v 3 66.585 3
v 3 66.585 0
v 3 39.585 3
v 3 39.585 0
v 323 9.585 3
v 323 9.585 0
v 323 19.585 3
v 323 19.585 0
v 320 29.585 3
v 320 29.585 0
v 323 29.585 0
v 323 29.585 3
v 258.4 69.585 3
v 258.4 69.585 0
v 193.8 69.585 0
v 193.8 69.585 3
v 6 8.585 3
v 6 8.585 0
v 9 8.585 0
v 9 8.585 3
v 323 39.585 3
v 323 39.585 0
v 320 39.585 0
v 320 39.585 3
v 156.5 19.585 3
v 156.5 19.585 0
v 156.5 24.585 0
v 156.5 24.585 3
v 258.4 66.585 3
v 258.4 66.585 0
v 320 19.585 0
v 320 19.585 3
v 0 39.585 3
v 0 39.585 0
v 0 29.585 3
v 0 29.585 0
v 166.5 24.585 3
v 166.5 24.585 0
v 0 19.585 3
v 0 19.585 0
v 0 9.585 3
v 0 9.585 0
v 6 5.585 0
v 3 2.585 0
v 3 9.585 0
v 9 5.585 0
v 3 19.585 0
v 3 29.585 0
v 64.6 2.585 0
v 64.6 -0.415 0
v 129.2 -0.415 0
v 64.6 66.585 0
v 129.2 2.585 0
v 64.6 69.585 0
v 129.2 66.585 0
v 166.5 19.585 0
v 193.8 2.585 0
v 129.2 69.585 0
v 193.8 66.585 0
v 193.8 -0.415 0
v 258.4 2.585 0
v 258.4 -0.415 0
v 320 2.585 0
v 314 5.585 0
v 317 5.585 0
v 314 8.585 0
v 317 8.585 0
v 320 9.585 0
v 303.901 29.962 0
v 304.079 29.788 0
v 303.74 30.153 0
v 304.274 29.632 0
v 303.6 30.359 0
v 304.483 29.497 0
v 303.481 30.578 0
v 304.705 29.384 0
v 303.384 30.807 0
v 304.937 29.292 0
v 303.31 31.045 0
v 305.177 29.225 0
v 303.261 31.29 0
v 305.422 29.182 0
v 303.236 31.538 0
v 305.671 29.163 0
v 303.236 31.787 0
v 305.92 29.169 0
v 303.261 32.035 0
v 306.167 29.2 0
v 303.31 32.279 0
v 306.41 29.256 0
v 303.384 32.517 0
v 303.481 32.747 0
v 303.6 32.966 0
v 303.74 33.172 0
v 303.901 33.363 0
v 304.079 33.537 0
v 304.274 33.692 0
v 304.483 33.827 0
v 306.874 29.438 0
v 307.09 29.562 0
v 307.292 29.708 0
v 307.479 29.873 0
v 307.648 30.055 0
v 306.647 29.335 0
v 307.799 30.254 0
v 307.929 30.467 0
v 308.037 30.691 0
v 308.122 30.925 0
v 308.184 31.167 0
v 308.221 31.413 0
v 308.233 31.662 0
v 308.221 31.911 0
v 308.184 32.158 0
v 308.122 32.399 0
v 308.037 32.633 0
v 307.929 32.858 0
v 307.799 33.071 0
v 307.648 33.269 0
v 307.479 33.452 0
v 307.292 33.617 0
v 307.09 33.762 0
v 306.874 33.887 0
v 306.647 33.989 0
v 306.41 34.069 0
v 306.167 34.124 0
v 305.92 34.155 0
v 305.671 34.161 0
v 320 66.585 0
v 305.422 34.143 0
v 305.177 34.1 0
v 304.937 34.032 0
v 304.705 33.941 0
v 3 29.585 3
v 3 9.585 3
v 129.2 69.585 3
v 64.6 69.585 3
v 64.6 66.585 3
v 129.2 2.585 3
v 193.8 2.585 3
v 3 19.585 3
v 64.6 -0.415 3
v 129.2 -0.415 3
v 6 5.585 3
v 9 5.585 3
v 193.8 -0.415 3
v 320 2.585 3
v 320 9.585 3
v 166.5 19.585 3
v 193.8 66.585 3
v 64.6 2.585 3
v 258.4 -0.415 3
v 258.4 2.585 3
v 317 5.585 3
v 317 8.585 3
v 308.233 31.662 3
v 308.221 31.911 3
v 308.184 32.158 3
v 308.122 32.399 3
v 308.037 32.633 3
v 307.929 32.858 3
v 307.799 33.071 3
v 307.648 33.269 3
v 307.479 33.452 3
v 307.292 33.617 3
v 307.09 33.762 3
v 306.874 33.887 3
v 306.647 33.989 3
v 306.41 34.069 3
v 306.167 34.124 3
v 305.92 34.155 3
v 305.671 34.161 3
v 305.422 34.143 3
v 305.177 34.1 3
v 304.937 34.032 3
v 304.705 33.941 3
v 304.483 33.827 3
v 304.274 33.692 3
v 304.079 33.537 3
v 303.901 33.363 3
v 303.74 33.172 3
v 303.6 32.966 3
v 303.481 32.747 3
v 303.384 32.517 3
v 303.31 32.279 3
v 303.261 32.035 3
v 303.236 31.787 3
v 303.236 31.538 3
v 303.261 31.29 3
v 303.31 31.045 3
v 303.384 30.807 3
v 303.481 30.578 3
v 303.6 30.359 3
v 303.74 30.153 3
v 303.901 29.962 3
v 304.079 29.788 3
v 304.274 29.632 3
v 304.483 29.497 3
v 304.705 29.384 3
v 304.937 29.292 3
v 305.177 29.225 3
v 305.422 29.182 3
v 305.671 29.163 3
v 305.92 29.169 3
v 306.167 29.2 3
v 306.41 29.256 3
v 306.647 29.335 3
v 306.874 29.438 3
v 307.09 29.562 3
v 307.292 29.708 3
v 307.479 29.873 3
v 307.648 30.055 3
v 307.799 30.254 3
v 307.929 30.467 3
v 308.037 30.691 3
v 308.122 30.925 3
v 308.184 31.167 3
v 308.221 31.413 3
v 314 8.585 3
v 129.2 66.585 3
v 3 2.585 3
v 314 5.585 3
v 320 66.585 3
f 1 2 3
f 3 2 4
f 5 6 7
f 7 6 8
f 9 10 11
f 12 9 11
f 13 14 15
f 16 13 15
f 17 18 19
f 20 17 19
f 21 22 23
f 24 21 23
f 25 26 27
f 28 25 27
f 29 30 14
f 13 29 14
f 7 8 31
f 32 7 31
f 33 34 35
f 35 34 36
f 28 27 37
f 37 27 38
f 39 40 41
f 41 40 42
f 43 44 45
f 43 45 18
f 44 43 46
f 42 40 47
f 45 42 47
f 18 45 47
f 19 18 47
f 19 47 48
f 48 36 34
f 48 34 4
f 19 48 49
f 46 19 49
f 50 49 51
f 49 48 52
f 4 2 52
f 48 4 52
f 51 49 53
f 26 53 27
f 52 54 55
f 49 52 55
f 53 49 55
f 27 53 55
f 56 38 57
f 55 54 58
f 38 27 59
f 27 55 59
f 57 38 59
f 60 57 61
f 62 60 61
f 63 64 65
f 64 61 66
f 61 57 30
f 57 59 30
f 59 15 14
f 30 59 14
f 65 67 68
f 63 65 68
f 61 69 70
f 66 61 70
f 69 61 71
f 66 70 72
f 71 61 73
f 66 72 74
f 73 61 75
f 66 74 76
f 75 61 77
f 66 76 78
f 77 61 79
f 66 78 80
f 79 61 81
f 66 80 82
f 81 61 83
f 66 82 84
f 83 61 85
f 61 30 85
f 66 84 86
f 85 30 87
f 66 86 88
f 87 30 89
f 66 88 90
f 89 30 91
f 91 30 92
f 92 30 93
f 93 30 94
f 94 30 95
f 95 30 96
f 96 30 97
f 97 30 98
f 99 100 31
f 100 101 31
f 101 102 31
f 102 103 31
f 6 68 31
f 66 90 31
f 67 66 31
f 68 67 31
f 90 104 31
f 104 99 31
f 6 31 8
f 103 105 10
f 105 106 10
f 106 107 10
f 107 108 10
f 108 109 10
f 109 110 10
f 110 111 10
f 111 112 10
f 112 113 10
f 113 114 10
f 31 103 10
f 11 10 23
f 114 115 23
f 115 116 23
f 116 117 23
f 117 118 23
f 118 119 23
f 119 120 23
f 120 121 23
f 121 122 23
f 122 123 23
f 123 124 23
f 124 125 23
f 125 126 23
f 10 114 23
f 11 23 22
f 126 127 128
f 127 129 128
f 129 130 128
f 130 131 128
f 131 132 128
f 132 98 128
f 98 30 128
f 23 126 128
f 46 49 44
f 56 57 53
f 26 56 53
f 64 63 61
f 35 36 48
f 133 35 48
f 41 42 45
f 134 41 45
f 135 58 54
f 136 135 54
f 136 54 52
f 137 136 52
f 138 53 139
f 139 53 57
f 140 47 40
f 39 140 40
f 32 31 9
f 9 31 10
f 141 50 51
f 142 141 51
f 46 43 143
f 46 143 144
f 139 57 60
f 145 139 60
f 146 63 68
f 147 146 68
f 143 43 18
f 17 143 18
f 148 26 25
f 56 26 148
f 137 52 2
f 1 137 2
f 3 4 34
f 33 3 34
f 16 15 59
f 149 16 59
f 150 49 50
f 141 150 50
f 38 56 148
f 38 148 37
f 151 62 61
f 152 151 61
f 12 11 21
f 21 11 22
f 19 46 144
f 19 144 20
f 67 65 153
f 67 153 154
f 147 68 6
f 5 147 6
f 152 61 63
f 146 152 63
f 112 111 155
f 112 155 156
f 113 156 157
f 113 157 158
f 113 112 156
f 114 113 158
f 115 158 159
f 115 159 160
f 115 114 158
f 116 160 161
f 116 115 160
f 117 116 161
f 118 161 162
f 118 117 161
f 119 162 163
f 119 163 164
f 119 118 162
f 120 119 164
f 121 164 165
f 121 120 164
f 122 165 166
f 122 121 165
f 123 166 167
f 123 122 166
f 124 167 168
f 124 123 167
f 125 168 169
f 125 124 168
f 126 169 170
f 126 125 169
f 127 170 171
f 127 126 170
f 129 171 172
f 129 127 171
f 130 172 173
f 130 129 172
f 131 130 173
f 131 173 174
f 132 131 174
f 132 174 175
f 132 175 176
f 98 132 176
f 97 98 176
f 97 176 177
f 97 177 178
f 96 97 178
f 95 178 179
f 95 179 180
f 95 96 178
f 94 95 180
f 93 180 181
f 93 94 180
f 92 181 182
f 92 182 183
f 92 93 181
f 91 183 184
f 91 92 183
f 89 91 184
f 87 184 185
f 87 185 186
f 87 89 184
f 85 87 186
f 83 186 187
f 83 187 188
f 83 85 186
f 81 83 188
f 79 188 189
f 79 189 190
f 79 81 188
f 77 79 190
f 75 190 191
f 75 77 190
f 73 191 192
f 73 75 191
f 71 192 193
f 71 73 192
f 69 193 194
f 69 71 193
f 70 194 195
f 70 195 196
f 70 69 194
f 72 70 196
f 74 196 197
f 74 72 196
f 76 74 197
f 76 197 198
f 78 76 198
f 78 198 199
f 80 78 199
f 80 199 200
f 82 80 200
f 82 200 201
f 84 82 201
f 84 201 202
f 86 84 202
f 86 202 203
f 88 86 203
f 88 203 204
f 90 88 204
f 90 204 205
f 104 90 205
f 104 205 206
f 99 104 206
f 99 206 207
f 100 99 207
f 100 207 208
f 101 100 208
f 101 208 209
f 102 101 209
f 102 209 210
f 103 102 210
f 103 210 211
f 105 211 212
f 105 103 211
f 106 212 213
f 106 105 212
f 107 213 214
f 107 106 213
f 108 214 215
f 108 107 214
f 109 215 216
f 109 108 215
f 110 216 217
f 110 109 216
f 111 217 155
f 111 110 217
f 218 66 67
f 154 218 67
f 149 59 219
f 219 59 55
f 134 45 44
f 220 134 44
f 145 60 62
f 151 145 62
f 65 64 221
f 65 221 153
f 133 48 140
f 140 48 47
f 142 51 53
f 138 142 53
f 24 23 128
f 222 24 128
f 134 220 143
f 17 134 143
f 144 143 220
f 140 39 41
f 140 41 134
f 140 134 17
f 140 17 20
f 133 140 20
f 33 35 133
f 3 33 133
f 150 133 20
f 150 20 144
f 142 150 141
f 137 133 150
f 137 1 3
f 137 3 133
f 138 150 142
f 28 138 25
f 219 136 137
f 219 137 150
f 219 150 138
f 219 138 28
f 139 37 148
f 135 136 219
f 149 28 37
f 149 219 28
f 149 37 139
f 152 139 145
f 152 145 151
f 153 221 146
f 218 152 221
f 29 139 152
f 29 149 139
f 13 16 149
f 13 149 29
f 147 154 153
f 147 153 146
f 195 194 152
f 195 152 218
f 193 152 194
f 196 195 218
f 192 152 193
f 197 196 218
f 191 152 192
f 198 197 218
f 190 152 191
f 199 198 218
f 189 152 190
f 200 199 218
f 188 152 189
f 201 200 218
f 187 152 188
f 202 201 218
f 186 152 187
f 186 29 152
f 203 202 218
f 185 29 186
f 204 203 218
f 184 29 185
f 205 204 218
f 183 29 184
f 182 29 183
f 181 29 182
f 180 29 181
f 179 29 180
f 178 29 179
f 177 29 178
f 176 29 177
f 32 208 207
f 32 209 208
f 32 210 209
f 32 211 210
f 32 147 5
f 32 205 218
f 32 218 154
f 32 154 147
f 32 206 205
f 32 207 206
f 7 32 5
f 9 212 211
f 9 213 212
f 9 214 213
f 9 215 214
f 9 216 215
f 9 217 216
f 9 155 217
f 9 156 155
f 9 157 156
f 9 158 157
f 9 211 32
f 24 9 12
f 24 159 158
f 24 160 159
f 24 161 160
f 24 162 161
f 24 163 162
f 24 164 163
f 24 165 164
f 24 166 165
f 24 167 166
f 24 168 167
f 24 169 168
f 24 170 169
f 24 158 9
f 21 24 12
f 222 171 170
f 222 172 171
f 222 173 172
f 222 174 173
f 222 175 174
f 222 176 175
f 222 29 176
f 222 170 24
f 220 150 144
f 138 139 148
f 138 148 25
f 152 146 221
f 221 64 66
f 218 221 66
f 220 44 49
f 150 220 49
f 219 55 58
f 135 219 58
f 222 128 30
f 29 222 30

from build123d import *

# Parameters (mm, degrees)
SKETCH1_R           = 2.5
SKETCH1_W           = 3
SKETCH1_H           = 3
SKETCH1_W_2         = 10
SKETCH1_H_2         = 5
BOSS_EXTRUDE1_DEPTH = 3


with BuildPart() as part:
    # Sketch1 → Boss-Extrude1 (new body)
    with BuildSketch(Plane.XY):
        Polygon((0, 39.585266036), (0, 29.585266036), (3, 29.585266036), (3, 19.585266036), (0, 19.585266036), (0, 9.585266036), (3, 9.585266036), (3, 2.585266036), (64.6, 2.585266036), (64.6, -0.414733964), (129.2, -0.414733964), (129.2, 2.585266036), (193.8, 2.585266036), (193.8, -0.414733964), (258.4, -0.414733964), (258.4, 2.585266036), (320, 2.585266036), (320, 9.585266036), (323, 9.585266036), (323, 19.585266036), (320, 19.585266036), (320, 29.585266036), (323, 29.585266036), (323, 39.585266036), (320, 39.585266036), (320, 66.585266036), (258.4, 66.585266036), (258.4, 69.585266036), (193.8, 69.585266036), (193.8, 66.585266036), (129.2, 66.585266036), (129.2, 69.585266036), (64.6, 69.585266036), (64.6, 66.585266036), (3, 66.585266036), (3, 39.585266036), align=None)
        with Locations((305.733190997, 31.662269088)):
            Circle(SKETCH1_R, mode=Mode.SUBTRACT)
        with Locations((315.5, 7.085266036)):
            Rectangle(SKETCH1_W, SKETCH1_H, mode=Mode.SUBTRACT)
        with Locations((7.5, 7.085266036)):
            Rectangle(SKETCH1_W, SKETCH1_H, mode=Mode.SUBTRACT)
        with Locations((161.5, 22.085266036)):
            Rectangle(SKETCH1_W_2, SKETCH1_H_2, mode=Mode.SUBTRACT)
    extrude(amount=BOSS_EXTRUDE1_DEPTH)


solid = part.part
